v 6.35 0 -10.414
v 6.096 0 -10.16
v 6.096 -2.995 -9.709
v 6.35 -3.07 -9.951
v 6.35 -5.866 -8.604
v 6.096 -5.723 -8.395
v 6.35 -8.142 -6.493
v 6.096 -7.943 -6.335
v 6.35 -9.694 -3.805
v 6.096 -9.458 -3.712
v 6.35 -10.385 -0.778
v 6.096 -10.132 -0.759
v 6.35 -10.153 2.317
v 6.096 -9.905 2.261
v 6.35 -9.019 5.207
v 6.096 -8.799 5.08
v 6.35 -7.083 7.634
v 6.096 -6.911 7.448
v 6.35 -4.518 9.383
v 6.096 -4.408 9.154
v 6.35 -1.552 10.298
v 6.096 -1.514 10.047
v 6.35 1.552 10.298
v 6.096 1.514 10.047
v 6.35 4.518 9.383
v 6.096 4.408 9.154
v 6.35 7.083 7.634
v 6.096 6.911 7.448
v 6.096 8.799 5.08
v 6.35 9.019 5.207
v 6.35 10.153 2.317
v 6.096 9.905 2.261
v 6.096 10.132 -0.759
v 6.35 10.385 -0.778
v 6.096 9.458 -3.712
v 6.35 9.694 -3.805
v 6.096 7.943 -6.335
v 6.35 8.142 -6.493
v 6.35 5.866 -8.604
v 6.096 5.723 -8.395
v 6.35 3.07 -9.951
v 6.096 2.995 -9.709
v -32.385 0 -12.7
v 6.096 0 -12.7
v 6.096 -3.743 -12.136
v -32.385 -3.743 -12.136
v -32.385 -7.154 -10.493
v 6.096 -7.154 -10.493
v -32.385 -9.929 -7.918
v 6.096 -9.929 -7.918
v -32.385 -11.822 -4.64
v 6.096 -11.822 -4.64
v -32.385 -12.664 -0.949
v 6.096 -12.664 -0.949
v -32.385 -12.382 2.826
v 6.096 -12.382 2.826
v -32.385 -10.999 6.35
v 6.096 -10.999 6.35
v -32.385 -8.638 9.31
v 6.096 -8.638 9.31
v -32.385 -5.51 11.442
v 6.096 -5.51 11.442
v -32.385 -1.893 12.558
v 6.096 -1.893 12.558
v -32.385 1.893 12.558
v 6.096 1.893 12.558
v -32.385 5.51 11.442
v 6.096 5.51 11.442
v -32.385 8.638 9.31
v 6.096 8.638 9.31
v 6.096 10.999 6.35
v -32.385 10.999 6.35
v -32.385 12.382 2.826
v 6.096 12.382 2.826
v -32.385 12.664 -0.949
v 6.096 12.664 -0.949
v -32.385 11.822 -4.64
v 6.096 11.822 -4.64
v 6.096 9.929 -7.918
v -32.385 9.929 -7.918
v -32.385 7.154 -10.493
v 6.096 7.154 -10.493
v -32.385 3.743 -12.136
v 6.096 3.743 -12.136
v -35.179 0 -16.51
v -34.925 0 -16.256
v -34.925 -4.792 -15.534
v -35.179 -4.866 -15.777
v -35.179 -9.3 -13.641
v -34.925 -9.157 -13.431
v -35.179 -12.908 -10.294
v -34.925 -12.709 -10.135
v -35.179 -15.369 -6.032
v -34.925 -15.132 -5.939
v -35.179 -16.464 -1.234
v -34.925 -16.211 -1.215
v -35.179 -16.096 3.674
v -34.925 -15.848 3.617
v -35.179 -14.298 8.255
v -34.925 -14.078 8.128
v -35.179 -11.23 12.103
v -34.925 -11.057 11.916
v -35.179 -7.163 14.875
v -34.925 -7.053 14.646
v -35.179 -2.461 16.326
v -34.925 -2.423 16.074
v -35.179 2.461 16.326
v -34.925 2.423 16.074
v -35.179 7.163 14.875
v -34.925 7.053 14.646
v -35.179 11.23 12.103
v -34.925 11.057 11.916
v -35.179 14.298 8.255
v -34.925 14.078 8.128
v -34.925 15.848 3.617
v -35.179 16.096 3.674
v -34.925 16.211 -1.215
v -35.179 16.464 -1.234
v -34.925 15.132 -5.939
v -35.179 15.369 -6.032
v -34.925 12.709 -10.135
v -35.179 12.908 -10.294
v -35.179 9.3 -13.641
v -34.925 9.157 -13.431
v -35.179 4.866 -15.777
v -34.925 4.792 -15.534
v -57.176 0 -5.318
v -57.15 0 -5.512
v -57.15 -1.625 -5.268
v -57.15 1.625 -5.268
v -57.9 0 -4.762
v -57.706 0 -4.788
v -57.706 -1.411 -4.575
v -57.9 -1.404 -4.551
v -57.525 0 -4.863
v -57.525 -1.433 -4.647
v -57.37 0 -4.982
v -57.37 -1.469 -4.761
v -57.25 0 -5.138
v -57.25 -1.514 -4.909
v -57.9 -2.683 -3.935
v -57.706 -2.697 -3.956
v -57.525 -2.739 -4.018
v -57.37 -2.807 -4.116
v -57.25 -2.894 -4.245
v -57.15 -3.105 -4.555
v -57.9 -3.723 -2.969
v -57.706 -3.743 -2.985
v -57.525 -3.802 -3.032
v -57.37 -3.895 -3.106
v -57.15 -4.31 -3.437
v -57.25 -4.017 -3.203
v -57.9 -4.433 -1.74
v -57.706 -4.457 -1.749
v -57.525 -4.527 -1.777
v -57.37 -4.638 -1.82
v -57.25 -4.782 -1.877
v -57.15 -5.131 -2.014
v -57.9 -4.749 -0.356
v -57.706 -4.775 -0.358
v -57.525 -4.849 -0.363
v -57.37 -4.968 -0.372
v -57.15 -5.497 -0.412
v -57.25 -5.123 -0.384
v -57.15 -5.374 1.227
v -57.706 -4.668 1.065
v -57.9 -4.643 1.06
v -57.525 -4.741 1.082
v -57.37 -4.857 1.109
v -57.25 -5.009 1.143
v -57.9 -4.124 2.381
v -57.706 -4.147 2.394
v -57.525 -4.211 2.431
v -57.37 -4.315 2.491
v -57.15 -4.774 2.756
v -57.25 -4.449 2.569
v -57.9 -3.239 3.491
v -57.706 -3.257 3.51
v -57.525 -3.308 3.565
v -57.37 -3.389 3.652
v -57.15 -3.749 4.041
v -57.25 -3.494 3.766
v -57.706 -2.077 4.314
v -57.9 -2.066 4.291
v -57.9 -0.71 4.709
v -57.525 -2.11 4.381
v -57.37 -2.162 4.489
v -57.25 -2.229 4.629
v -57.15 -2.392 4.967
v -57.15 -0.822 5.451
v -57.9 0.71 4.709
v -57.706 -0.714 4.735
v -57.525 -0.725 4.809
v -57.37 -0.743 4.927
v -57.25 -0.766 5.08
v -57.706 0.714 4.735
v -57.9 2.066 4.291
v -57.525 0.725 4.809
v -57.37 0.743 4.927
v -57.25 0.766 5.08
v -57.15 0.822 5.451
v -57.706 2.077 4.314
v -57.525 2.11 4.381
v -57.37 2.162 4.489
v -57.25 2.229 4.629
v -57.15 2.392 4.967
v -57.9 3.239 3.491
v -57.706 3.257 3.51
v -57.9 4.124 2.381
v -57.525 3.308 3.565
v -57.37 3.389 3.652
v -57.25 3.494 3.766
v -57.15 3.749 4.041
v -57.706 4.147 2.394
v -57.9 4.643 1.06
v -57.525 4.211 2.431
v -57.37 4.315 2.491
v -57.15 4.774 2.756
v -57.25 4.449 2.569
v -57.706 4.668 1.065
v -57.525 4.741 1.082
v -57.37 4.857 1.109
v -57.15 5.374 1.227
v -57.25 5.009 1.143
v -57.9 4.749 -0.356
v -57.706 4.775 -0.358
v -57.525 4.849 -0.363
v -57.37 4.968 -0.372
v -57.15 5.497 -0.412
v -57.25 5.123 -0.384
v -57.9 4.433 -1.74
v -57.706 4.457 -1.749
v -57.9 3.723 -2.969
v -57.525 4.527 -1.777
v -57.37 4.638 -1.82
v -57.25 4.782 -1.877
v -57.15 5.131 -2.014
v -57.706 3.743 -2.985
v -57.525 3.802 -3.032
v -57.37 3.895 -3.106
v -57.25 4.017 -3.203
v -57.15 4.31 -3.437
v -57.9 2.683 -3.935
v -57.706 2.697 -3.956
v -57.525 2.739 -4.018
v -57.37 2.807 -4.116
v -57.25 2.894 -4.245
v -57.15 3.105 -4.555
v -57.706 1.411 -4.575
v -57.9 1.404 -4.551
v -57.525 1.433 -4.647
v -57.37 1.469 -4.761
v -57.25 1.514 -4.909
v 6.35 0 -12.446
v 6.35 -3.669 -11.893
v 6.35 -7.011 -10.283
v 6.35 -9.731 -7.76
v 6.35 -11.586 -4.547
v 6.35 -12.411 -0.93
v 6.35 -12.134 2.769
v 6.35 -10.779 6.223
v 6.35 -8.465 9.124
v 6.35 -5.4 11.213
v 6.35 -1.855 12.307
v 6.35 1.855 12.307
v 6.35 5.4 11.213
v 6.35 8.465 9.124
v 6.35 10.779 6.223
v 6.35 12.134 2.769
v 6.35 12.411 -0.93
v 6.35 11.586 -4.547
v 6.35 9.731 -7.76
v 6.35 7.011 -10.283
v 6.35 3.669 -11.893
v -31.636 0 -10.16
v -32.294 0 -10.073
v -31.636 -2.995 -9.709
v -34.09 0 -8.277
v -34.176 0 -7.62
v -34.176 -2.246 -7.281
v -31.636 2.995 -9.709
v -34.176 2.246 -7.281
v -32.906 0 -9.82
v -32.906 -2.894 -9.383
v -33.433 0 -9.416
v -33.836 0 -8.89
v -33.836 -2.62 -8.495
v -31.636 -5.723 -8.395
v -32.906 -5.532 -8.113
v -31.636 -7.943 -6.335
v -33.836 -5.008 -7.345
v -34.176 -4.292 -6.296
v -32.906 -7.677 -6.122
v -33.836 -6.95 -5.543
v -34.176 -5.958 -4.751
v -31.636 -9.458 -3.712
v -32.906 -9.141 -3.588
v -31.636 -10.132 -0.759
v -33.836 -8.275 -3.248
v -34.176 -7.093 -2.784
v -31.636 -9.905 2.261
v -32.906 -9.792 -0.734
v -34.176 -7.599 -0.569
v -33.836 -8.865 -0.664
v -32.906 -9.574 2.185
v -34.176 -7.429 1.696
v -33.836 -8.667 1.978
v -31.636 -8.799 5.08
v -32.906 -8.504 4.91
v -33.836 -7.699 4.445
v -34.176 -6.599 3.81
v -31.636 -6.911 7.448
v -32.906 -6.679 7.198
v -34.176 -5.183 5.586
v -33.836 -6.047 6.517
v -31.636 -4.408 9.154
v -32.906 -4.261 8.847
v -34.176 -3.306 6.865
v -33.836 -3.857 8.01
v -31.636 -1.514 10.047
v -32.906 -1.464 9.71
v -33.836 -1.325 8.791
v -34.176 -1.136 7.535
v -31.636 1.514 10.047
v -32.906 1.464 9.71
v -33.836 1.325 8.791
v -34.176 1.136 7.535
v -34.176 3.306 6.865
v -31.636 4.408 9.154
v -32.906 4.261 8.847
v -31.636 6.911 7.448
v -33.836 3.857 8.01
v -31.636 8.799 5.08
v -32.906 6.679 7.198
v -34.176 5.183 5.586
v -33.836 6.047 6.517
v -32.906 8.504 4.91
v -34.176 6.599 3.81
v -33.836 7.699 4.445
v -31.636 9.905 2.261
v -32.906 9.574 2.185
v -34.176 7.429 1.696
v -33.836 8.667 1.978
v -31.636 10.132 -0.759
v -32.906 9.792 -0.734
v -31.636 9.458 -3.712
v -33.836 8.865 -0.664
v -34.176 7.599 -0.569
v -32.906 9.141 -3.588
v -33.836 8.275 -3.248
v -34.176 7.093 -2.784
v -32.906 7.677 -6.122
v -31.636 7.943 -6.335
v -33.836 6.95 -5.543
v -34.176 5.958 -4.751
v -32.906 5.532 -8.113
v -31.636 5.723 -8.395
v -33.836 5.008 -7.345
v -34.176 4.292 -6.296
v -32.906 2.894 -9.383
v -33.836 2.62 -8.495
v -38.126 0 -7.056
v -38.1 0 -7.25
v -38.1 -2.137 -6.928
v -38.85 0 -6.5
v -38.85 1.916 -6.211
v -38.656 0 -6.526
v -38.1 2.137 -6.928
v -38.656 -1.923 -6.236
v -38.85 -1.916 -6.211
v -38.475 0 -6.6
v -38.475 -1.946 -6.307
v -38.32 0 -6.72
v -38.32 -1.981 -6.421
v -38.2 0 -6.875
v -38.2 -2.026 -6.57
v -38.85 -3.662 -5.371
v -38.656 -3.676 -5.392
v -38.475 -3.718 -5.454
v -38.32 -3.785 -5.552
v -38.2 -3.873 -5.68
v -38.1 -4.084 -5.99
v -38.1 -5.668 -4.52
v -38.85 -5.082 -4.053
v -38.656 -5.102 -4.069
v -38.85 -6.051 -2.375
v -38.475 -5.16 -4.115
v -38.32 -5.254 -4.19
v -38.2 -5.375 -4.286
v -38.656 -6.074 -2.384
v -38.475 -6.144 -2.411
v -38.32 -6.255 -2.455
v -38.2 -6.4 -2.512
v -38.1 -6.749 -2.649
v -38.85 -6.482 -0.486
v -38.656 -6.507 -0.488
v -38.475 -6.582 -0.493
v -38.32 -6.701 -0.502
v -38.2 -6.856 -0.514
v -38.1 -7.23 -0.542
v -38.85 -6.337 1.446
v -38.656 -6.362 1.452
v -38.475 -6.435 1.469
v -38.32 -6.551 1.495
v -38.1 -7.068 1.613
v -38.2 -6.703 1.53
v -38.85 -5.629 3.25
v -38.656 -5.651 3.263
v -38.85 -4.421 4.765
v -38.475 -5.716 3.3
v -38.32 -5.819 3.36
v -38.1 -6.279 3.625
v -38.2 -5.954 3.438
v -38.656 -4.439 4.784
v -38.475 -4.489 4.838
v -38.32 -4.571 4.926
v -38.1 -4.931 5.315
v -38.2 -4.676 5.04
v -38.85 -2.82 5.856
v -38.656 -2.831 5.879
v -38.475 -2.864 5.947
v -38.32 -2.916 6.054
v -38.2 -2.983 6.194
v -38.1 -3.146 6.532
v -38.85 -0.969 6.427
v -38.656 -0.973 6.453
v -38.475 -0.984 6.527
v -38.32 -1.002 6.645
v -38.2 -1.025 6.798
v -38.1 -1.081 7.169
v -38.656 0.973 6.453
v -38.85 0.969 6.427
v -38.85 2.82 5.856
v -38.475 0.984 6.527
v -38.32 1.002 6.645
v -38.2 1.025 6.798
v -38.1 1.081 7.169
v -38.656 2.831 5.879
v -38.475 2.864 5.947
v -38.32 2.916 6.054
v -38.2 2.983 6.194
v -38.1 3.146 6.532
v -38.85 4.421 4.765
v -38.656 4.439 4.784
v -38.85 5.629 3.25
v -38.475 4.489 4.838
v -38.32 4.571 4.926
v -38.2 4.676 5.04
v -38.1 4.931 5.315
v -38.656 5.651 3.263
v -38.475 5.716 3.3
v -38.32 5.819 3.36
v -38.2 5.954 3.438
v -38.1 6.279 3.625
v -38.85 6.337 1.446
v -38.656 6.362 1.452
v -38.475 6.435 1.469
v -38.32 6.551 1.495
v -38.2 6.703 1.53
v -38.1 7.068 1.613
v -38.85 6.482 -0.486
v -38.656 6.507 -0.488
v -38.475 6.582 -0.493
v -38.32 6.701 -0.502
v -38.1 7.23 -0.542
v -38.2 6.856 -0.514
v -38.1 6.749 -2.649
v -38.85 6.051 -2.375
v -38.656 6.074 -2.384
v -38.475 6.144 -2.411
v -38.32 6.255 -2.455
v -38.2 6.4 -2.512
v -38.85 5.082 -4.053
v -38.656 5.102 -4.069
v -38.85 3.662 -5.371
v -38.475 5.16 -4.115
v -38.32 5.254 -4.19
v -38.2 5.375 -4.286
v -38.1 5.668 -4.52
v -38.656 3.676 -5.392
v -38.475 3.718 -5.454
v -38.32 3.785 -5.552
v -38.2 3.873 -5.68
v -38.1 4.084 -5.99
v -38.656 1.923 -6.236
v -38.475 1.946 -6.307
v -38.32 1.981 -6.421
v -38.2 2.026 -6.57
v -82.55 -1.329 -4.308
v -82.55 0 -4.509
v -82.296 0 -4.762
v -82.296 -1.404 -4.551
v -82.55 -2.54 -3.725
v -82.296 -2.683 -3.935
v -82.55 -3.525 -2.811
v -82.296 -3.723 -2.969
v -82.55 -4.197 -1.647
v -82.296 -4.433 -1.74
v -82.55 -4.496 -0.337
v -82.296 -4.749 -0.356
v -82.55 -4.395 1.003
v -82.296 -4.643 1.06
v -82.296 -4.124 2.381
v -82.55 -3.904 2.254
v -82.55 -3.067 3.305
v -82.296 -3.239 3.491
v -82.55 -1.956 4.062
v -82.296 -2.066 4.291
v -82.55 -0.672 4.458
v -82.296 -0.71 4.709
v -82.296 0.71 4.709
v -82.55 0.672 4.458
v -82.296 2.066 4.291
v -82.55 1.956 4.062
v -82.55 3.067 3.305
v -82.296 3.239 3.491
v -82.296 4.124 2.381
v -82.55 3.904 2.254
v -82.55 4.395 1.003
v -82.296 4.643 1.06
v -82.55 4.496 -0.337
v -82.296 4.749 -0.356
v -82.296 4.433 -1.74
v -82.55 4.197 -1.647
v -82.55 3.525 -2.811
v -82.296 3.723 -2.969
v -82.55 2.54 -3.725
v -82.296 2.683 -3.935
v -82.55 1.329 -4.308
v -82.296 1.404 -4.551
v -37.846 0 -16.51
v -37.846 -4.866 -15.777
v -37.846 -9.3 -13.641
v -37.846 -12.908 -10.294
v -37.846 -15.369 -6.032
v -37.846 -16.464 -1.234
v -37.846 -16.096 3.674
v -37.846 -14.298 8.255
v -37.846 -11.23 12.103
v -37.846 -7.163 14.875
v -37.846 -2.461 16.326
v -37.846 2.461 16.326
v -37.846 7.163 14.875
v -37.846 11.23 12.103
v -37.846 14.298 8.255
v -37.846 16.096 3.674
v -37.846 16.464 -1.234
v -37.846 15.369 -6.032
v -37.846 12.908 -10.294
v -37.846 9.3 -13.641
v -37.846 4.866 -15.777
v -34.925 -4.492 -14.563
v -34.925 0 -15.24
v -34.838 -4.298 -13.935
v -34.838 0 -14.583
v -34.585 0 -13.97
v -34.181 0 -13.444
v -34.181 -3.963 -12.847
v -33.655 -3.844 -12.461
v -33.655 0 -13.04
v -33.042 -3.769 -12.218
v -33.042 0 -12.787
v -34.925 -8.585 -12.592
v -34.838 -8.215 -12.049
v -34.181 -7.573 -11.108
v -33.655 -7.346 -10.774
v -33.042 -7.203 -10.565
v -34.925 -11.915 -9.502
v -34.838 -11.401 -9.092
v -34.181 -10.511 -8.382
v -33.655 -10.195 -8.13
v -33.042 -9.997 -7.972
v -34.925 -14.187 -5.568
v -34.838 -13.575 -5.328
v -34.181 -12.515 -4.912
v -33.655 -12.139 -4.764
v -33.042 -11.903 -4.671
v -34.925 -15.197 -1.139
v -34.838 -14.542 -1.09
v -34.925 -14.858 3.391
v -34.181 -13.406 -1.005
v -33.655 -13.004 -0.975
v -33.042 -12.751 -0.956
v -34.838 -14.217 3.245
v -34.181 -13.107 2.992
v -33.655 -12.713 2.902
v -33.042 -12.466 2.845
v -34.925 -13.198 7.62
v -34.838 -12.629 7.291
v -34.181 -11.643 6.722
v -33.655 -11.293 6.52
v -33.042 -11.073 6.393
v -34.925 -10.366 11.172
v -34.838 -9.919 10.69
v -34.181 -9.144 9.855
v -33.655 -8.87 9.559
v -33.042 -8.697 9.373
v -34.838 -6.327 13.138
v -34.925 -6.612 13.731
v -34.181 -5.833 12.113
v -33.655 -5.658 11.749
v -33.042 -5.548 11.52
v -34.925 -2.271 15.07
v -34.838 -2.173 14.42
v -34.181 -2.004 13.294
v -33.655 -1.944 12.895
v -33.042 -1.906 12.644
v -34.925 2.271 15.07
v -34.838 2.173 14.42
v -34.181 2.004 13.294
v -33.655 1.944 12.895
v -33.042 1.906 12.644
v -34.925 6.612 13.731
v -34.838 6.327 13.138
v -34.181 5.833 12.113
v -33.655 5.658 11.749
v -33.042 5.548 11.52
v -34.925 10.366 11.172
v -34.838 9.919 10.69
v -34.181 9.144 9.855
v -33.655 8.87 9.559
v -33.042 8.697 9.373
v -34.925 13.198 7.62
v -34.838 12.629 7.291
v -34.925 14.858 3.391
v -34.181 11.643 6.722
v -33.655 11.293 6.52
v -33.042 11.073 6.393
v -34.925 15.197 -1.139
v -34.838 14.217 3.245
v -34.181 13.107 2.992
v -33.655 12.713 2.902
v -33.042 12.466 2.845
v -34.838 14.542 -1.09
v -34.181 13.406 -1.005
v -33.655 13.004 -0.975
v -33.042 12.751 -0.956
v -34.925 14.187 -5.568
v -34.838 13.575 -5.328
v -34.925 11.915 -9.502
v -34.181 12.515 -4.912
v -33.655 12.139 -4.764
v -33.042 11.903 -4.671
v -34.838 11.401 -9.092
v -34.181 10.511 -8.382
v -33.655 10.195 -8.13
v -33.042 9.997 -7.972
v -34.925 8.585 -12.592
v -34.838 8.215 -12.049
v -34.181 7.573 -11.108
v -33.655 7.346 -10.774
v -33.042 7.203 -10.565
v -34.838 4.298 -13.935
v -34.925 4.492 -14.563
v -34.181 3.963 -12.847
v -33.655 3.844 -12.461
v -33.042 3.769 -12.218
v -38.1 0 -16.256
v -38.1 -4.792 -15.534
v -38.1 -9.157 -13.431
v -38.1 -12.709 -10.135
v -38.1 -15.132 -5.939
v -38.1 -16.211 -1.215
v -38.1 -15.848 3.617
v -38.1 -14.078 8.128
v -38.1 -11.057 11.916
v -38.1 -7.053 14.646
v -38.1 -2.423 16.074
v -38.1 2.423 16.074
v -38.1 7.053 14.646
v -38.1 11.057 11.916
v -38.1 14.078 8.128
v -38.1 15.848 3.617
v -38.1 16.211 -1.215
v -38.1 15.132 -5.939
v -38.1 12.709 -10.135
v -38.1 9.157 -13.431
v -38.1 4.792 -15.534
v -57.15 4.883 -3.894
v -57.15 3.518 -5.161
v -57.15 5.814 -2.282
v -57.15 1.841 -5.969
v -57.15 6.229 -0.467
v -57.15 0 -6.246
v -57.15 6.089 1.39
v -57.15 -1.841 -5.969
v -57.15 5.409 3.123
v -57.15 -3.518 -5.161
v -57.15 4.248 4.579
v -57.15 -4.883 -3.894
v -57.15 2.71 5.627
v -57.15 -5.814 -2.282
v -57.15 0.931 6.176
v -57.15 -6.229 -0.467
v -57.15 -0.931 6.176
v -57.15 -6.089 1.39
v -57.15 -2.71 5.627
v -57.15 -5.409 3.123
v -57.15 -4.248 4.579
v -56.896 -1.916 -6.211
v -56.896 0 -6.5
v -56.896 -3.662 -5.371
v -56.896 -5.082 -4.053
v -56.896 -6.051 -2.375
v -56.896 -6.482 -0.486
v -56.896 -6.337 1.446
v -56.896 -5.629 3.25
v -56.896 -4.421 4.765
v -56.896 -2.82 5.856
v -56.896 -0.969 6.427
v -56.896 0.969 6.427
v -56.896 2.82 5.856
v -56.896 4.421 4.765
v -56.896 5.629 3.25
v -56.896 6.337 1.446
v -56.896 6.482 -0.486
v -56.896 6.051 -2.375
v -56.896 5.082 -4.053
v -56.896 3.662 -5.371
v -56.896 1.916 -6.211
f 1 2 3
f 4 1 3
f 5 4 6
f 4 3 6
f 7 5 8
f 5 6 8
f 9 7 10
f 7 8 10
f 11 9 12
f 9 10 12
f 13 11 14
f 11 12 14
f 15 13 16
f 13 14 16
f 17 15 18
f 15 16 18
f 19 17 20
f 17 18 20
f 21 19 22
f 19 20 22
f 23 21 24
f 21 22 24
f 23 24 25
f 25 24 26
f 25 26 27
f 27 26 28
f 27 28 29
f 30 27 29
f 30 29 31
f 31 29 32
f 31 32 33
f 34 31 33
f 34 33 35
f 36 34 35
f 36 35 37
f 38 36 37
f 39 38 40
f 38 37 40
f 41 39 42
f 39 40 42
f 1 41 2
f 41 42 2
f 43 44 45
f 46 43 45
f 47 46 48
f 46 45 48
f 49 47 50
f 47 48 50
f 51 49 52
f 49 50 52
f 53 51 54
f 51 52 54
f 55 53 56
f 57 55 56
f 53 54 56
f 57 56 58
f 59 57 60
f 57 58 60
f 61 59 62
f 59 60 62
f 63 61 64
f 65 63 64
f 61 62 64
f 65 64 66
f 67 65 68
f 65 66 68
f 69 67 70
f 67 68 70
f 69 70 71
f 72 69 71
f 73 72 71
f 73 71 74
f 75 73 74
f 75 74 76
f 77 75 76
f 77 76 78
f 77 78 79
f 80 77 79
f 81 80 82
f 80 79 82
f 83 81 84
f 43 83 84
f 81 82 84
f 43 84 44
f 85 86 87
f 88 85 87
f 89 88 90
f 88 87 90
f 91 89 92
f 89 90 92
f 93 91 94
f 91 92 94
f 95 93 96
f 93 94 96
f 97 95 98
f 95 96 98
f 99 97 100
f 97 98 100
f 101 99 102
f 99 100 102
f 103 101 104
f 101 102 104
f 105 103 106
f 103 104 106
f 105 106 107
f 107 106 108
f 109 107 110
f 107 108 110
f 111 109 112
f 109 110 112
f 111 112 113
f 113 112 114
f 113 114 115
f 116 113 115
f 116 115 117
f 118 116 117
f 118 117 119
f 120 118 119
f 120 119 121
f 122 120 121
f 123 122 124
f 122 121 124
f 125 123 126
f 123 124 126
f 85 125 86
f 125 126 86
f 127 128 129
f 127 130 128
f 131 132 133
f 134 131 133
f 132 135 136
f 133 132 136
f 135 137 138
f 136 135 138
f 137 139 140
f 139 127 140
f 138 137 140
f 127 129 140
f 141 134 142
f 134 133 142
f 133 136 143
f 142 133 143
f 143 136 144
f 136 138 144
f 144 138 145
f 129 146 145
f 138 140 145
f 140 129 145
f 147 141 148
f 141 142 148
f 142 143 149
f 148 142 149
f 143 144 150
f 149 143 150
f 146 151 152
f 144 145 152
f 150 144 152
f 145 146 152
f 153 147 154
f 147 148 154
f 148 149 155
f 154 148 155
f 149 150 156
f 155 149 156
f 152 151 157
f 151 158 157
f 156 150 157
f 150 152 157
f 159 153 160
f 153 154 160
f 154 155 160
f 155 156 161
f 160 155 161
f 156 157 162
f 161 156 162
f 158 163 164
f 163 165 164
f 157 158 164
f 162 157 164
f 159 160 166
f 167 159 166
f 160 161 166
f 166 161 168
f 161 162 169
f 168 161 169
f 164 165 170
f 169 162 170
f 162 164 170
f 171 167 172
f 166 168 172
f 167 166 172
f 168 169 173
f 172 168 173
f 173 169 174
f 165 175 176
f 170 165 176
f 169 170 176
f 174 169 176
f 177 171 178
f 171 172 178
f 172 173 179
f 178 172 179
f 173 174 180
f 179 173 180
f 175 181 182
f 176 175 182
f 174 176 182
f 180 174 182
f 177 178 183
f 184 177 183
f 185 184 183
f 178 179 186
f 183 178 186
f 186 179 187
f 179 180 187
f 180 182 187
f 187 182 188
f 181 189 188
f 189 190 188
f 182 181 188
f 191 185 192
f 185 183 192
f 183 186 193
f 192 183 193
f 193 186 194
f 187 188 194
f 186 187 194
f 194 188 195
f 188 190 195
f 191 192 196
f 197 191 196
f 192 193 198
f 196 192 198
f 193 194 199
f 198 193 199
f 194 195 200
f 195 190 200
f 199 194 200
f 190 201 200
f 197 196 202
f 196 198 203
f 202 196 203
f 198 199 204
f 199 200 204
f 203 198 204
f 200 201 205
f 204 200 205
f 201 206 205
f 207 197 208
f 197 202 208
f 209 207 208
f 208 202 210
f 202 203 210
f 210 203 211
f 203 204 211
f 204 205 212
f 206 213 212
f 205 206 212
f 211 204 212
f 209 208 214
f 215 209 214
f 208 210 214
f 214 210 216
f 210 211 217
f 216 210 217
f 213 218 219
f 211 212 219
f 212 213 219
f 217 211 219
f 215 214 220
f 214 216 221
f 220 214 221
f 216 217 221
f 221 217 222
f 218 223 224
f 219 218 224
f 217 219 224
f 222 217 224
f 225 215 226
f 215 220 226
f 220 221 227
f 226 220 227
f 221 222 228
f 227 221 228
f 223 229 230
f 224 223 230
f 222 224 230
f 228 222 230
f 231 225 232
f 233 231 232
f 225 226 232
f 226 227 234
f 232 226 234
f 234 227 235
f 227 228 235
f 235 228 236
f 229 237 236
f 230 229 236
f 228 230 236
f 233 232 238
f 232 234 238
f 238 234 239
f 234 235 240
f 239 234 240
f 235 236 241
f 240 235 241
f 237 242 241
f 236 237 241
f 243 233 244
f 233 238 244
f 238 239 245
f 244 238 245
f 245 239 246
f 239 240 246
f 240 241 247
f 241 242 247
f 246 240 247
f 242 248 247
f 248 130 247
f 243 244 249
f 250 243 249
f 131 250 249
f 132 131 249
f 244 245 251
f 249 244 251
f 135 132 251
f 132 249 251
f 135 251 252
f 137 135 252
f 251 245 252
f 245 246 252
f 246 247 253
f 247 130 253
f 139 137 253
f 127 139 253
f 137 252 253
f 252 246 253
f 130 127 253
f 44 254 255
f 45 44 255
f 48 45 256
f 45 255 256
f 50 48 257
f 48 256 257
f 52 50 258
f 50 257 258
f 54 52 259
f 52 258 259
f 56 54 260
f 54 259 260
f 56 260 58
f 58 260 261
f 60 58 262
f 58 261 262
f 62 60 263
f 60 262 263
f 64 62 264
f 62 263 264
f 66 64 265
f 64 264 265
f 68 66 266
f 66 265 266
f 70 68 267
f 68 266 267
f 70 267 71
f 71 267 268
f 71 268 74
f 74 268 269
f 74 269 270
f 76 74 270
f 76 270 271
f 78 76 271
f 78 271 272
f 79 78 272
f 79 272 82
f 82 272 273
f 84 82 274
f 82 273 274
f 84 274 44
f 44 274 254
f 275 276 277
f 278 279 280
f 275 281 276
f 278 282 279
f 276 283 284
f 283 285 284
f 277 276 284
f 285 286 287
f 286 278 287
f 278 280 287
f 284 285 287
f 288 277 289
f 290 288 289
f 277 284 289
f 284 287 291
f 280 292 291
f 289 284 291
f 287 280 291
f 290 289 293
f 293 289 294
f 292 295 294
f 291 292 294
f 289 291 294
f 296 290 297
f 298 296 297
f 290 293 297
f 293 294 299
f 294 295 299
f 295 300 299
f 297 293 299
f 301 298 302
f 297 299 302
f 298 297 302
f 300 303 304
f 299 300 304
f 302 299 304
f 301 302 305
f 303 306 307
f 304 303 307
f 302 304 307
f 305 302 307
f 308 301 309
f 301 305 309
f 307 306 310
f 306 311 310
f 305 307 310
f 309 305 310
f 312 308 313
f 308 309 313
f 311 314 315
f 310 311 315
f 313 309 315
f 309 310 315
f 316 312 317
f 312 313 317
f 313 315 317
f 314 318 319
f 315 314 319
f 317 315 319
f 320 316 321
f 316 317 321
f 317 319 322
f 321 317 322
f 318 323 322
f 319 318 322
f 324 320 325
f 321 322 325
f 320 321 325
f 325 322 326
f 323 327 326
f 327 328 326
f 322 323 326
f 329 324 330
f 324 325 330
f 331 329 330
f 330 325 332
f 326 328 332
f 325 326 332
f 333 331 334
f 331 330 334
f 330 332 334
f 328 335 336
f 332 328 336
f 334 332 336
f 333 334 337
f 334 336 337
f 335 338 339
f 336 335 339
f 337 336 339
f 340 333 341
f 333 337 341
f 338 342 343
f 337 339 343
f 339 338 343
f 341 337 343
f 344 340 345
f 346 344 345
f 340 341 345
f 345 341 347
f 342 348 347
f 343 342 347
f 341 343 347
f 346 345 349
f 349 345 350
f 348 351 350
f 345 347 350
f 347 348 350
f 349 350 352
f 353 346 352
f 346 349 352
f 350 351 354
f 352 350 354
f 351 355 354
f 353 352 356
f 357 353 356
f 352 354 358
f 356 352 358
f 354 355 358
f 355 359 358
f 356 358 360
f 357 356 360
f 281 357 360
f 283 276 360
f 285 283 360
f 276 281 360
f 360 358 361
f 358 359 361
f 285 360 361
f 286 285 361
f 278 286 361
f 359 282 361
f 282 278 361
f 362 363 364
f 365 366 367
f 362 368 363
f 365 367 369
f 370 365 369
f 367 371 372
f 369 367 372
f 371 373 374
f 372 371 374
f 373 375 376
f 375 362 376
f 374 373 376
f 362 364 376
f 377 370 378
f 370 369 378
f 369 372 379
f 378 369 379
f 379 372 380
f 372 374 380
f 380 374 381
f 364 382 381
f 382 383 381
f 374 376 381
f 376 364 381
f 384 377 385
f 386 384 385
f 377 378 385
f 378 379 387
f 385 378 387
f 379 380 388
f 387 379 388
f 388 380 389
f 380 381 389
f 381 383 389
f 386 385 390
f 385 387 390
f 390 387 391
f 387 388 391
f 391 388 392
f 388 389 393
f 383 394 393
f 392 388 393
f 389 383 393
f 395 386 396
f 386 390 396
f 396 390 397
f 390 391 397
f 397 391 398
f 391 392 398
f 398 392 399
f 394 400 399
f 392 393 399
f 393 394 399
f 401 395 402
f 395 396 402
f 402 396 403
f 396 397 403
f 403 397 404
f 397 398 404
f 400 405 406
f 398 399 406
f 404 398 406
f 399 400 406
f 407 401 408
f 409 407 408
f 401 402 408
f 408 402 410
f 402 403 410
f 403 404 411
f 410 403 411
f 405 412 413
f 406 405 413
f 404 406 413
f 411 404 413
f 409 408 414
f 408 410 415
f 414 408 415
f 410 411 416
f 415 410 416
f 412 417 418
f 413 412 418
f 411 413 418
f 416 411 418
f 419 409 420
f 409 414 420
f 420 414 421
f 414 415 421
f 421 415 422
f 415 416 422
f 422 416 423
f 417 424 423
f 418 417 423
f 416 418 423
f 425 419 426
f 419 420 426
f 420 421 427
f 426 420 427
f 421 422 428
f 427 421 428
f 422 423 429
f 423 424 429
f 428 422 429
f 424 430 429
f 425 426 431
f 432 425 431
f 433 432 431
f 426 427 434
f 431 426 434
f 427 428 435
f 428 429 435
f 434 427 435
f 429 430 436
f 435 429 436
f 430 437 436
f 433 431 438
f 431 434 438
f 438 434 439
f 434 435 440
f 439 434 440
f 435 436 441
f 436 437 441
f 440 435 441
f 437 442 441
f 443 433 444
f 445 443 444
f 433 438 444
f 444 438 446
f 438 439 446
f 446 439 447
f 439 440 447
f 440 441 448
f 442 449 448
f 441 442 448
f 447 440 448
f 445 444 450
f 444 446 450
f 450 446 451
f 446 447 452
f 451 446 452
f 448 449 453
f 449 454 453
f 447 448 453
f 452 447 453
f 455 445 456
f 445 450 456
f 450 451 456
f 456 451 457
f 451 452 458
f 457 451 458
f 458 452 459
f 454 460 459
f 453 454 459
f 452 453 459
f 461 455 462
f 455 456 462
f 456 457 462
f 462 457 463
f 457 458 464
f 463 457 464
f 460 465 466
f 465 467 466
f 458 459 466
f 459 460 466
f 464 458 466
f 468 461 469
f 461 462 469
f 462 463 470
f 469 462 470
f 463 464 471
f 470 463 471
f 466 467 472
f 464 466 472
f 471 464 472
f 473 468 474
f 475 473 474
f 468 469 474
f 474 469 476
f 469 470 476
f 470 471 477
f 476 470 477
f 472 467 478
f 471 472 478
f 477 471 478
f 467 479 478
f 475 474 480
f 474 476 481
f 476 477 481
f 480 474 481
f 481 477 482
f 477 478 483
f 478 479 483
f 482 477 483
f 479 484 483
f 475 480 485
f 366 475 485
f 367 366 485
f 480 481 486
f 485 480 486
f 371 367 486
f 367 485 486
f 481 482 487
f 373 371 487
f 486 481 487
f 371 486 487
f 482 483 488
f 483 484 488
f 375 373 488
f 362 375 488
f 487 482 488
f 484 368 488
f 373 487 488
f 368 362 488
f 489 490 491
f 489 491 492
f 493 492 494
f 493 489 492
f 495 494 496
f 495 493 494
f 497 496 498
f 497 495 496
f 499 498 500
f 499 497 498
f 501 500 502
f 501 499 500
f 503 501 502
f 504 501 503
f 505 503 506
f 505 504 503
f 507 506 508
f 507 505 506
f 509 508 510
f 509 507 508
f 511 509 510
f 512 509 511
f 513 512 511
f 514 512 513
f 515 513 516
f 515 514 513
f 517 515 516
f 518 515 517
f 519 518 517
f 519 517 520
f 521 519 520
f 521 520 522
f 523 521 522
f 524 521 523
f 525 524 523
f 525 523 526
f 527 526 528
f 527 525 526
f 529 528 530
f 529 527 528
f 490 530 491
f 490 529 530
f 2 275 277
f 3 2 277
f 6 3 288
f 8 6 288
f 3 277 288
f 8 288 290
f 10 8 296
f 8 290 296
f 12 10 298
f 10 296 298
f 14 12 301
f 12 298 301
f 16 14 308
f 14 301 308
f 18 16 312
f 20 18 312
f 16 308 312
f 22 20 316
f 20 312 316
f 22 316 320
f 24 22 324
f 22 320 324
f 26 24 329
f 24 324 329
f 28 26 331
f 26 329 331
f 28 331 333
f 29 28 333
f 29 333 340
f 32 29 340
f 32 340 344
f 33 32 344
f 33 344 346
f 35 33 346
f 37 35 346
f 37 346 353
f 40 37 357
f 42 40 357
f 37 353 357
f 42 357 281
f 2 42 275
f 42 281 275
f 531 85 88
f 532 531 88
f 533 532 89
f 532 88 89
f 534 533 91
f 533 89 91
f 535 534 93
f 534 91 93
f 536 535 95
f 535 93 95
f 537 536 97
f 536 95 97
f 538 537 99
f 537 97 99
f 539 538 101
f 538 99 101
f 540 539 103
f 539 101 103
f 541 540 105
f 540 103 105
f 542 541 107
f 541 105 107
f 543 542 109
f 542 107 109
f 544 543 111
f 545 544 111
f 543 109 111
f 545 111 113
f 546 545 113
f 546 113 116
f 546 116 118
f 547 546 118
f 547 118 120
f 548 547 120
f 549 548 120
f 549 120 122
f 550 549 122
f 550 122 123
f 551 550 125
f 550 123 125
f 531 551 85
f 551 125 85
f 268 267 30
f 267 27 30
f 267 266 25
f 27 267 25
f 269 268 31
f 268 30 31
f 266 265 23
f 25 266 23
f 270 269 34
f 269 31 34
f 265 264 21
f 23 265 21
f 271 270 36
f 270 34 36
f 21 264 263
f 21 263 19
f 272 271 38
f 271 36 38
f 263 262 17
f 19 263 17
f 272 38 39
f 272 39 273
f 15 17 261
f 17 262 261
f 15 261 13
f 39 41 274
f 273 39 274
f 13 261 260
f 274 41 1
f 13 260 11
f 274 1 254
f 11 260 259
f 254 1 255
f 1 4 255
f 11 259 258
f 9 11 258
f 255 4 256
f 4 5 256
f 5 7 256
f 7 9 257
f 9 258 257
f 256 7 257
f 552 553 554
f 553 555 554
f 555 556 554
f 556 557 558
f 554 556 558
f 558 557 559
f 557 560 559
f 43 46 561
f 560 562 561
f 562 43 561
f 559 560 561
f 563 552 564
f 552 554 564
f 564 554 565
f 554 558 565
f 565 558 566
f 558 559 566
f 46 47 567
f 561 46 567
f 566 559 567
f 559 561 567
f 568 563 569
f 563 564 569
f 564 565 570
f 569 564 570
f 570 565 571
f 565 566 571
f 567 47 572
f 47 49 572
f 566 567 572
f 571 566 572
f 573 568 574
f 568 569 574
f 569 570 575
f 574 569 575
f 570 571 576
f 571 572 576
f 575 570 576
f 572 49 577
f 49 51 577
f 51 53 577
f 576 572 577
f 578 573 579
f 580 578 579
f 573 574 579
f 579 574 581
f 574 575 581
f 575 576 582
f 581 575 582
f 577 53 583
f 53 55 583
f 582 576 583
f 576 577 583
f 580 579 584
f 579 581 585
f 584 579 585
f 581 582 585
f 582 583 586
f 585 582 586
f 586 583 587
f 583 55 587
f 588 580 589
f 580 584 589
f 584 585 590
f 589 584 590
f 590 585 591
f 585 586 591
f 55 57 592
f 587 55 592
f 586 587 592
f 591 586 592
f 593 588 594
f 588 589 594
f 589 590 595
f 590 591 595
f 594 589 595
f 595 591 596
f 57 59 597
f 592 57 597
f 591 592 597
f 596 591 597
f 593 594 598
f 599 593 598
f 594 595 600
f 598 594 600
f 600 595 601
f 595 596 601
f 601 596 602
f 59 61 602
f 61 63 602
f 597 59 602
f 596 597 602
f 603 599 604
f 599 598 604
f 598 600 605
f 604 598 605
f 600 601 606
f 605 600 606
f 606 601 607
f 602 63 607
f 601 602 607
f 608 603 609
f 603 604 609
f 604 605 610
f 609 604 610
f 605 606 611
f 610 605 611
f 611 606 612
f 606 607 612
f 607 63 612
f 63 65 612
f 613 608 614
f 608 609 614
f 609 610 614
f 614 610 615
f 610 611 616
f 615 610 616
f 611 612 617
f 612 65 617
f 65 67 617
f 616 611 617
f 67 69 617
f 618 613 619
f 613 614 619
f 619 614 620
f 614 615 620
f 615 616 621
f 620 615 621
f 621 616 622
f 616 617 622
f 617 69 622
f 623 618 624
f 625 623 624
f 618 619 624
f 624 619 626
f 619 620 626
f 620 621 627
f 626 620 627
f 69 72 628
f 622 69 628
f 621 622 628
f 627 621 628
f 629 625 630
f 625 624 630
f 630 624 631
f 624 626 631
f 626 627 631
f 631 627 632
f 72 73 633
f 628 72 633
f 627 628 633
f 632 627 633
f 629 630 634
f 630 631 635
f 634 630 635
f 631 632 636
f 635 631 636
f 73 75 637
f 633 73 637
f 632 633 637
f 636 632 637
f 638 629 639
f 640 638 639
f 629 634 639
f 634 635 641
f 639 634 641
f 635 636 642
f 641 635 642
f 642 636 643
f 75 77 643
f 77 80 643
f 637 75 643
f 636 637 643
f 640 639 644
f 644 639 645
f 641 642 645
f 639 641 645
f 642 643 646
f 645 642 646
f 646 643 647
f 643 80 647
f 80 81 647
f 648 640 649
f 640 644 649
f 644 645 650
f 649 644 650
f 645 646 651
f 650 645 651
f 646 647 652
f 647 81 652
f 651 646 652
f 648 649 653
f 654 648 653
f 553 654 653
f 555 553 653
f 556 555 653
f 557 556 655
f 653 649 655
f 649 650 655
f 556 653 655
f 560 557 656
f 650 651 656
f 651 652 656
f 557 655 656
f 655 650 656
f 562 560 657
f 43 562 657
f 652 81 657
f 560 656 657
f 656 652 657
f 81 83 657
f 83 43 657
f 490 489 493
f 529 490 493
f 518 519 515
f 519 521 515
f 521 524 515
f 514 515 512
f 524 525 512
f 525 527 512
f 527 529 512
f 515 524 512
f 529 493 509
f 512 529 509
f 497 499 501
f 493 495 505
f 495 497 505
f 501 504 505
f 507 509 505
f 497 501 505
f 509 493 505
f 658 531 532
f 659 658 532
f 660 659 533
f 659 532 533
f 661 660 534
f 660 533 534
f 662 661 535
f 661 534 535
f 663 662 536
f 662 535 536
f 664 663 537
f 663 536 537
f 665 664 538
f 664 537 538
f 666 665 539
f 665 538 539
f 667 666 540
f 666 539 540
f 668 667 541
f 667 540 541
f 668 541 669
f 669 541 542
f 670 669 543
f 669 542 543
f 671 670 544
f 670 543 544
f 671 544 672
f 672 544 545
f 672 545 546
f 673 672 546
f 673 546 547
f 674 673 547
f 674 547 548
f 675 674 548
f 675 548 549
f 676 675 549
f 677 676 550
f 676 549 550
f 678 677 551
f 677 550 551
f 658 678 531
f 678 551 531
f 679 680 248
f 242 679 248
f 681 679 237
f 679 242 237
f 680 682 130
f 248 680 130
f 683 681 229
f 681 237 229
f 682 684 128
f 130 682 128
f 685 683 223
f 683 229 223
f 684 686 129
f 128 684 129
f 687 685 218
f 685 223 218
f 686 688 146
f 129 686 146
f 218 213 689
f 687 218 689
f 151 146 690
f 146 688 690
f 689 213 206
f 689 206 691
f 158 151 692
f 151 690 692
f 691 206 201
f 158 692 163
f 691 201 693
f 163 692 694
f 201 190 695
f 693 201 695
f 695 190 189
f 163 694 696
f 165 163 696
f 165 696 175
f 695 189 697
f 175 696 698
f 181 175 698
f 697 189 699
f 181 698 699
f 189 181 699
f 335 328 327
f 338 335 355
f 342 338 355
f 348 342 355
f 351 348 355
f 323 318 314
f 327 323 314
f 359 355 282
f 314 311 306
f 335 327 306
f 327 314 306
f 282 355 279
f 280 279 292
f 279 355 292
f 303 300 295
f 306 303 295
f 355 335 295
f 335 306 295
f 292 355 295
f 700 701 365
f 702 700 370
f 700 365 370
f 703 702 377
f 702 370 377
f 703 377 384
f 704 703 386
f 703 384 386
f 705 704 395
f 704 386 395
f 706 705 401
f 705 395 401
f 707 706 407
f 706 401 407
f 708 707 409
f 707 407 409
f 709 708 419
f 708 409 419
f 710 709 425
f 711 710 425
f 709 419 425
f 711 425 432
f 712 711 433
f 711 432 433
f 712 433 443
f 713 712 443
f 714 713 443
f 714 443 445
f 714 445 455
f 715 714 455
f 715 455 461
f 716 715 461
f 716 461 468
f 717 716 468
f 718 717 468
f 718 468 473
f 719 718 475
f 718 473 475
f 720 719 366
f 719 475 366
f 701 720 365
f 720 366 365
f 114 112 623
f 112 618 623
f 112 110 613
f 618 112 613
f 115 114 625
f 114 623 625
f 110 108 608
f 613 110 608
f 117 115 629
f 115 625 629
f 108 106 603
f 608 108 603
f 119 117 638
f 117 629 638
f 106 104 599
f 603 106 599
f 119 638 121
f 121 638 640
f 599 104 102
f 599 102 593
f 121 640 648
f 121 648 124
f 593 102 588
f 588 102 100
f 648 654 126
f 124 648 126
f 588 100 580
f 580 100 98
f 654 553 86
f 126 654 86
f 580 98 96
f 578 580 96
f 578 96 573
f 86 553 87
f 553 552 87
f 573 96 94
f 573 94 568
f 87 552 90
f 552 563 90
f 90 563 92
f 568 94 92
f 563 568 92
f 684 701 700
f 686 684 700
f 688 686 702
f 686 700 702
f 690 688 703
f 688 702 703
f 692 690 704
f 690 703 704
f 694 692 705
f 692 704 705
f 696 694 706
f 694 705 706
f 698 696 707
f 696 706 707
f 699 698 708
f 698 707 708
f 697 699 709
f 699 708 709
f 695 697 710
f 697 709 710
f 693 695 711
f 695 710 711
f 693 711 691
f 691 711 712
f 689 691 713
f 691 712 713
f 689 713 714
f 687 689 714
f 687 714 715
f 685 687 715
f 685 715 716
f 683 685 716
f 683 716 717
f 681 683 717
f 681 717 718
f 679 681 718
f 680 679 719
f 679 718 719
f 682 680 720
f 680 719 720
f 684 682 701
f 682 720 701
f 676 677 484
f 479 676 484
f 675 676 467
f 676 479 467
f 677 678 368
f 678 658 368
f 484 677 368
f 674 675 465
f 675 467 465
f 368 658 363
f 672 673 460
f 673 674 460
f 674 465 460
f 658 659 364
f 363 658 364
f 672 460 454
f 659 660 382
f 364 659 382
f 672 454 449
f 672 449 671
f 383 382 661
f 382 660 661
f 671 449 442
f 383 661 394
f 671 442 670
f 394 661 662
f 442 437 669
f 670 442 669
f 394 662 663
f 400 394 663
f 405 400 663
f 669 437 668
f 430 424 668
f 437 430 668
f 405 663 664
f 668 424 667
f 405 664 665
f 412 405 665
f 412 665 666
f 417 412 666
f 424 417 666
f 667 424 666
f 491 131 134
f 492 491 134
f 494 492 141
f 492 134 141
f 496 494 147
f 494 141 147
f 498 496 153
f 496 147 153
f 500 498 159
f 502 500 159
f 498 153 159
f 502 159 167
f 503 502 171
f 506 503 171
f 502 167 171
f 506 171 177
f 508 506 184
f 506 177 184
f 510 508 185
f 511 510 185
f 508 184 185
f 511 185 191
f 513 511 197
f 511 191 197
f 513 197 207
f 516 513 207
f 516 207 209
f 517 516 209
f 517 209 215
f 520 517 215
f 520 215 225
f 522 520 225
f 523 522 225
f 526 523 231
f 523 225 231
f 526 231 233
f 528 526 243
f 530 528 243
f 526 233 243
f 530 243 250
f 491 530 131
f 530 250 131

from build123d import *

# Parameters (mm, degrees)
FILLET2_R     = 0.75
CHAMFER1_SIZE = 0.254


with BuildPart() as part:
    # Sketch1 → Revolve1 (revolve)
    with BuildSketch(Plane(origin=(0, 0, 0), x_dir=(1, 0, 0), z_dir=(0, 1, 0))):
        with BuildLine():
            Line((6.35, 10.16), (-31.636489348, 10.16))
            ThreePointArc((-31.636489348, 10.16), (-33.432540572, 9.416051224), (-34.176489348, 7.62))
            Line((-34.176489348, 7.62), (-34.176489348, 0))
            Line((-34.176489348, 0), (-82.55, 0))
            Line((-82.55, 0), (-82.55, 4.7625))
            Line((-82.55, 4.7625), (-57.15, 4.7625))
            Line((-57.15, 4.7625), (-57.15, 6.5))
            Line((-57.15, 6.5), (-38.1, 6.5))
            Line((-38.1, 6.5), (-38.1, 16.51))
            Line((-38.1, 16.51), (-34.925, 16.51))
            Line((-34.925, 16.51), (-34.925, 15.24))
            ThreePointArc((-34.925, 15.24), (-34.181051224, 13.443948776), (-32.385, 12.7))
            Line((-32.385, 12.7), (6.35, 12.7))
            Line((6.35, 12.7), (6.35, 10.16))
        make_face()
    revolve(axis=Axis((0, 0, 0), (-1, 0, 0)))

    # Fillet2
    fillet2_edges = [part.edges().sort_by_distance(p)[0] for p in [
        (-57.15, 0, 4.7625),
        (-38.1, 0, 6.5),
    ]]
    fillet(fillet2_edges, radius=FILLET2_R)

    # Chamfer1
    chamfer1_edges = [part.edges().sort_by_distance(p)[0] for p in [
        (-57.15, 0, 6.5),
        (-38.1, 0, 16.51),
        (-34.925, 0, 16.51),
        (6.35, 0, 12.7),
        (6.35, 0, 10.16),
        (-82.55, 0, 4.7625),
    ]]
    chamfer(chamfer1_edges, length=CHAMFER1_SIZE)


solid = part.part
